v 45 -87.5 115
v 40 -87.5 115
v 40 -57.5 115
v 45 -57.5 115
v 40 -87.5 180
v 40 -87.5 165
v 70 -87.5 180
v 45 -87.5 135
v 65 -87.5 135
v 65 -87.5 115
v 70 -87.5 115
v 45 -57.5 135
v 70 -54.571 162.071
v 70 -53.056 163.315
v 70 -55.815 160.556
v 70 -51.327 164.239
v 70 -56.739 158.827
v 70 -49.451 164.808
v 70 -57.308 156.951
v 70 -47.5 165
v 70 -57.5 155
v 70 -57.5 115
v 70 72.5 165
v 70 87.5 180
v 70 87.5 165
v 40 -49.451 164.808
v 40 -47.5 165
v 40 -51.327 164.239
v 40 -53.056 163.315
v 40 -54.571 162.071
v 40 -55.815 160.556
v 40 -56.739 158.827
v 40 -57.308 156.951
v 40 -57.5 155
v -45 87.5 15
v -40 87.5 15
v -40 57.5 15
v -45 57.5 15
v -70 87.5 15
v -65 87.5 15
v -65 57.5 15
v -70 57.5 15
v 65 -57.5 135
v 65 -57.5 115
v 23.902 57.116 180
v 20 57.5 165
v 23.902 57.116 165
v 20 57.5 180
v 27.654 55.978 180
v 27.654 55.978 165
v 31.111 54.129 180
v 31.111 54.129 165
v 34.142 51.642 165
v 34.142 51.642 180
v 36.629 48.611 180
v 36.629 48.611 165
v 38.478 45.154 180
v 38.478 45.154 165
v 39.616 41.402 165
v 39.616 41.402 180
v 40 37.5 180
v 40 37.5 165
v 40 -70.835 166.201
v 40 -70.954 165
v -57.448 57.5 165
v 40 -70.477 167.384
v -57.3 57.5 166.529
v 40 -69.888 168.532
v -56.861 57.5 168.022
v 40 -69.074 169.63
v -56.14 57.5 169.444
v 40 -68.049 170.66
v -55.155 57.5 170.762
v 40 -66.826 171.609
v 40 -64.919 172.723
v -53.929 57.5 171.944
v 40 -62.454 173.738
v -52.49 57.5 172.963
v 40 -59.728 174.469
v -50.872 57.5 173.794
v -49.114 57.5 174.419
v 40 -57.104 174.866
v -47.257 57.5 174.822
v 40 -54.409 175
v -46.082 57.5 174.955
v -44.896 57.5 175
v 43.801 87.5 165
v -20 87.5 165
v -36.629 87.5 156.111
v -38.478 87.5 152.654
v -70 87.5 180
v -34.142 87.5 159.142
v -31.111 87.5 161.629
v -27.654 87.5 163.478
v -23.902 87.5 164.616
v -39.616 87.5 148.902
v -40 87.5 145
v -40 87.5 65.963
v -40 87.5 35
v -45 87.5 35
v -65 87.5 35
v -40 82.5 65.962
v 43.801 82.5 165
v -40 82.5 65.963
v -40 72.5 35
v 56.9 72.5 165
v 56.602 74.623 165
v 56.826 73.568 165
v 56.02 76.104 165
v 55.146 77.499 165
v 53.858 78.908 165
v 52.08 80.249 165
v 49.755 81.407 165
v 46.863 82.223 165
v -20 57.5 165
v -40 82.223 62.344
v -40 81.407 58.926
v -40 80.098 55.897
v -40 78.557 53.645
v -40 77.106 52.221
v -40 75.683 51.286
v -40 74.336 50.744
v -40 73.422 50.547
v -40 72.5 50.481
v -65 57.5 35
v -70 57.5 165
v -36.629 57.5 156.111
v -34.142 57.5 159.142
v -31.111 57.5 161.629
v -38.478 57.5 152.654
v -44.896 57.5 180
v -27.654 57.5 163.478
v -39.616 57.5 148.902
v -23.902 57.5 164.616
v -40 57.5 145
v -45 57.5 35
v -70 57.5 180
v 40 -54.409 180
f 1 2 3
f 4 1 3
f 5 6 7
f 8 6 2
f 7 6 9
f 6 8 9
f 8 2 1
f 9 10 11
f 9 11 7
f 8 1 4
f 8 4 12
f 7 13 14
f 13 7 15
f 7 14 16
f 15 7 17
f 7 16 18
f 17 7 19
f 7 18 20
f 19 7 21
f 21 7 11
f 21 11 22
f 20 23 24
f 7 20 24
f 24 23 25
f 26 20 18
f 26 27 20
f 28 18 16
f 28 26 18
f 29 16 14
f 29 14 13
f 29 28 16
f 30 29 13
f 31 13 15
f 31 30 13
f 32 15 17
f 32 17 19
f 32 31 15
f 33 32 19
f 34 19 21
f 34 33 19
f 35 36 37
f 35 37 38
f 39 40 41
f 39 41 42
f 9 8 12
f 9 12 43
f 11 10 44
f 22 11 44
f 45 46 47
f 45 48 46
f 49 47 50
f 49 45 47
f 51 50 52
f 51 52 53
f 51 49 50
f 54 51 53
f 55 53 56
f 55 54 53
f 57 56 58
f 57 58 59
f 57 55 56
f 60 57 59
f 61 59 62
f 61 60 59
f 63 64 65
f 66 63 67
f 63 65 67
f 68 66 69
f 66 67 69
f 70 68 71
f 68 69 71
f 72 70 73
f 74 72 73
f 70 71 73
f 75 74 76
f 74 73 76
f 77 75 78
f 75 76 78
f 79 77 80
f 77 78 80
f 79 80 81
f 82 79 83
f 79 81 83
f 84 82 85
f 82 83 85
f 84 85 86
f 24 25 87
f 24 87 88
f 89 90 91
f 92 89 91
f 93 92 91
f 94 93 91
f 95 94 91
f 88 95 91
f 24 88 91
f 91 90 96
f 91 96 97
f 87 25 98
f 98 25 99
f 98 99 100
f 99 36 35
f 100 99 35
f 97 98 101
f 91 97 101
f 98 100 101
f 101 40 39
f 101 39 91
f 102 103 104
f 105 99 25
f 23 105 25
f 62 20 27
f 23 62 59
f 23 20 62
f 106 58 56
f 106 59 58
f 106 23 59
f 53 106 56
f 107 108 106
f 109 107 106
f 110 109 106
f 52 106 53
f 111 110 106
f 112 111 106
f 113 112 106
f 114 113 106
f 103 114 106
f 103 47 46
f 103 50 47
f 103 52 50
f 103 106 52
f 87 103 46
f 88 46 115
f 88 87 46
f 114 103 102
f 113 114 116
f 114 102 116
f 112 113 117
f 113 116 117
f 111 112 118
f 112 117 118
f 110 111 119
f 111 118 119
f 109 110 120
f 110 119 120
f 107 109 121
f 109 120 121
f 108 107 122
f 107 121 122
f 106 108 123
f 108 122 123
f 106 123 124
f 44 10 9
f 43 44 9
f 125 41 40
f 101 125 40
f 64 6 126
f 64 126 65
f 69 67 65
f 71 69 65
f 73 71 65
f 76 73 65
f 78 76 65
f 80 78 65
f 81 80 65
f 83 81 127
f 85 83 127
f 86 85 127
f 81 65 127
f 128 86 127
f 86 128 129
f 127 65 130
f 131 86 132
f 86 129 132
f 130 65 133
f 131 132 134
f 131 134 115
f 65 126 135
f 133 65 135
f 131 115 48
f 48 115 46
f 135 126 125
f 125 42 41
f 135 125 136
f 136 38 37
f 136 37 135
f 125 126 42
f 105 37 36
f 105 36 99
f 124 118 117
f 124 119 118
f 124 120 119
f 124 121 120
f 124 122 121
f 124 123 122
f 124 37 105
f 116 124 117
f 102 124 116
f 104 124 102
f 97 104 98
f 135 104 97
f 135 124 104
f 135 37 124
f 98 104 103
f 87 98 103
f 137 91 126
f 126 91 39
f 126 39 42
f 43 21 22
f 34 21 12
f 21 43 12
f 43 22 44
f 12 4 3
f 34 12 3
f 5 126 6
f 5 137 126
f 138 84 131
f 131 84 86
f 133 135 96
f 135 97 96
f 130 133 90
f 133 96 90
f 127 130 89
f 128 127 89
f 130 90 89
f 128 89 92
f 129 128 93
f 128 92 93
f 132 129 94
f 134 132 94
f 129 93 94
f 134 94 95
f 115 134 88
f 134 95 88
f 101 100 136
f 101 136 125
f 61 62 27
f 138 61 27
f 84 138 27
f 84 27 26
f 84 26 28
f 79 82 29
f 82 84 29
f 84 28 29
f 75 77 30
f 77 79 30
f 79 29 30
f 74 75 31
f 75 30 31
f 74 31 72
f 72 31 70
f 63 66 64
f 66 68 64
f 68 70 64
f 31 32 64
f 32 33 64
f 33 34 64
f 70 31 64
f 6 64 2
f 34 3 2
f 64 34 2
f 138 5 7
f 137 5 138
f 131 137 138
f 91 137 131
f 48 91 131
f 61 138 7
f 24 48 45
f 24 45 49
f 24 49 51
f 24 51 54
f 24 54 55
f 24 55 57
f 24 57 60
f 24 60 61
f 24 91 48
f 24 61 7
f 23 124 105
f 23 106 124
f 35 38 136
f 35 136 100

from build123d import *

# Parameters (mm, degrees)
SKETCH_1_W           = 140
SKETCH_1_H           = 175
EXTRUDE_1_DEPTH      = 150
SKETCH_2_W           = 110
SKETCH_2_H           = 145
CUT_EXTRUDE_1_DEPTH  = 150
SKETCH_3_W           = 115
SKETCH_3_H           = 145
CUT_EXTRUDE_2_DEPTH  = 150
SKETCH_4_W           = 110
SKETCH_4_H           = 135
CUT_EXTRUDE_3_DEPTH  = 150
SKETCH_5_W           = 20
SKETCH_5_H           = 40
CUT_EXTRUDE_4_DEPTH  = 150
SKETCH_6_W           = 20
SKETCH_6_H           = 115
CUT_EXTRUDE_5_DEPTH  = 150
EXTRUDE_2_DEPTH      = 30
CUT_EXTRUDE_6_DEPTH  = 30
SKETCH_9_W           = 30
SKETCH_9_H           = 30
CUT_EXTRUDE_7_DEPTH  = 15
SKETCH_10_W          = 20
SKETCH_10_H          = 60
CUT_EXTRUDE_8_DEPTH  = 20
EXTRUDE_3_DEPTH      = 5
EXTRUDE_4_DEPTH      = 5
EXTRUDE_1_2_DEPTH    = 10
EXTRUDE_2_2_DEPTH    = 10
FILLET_1_R           = 10
CUT_EXTRUDE_9_DEPTH  = 52
CUT_EXTRUDE_10_DEPTH = 52
FILLET_2_R           = 20
FILLET_3_R           = 10


with BuildPart() as part:
    # 草图1 → Extrude 1 (new body)
    with BuildSketch(Plane.XY):
        Rectangle(SKETCH_1_W, SKETCH_1_H)
    extrude(amount=EXTRUDE_1_DEPTH)

    # 草图2 → 切除-拉伸1 (cut)
    with BuildSketch(Plane.XY.offset(150)):
        with Locations((-15, -15)):
            Rectangle(SKETCH_2_W, SKETCH_2_H)
    extrude(amount=-CUT_EXTRUDE_1_DEPTH, mode=Mode.SUBTRACT)

    # 草图3 → 切除-拉伸2 (cut)
    with BuildSketch(Plane.ZY.offset(-40)):
        with Locations((57.5, -15)):
            Rectangle(SKETCH_3_W, SKETCH_3_H)
    extrude(amount=-CUT_EXTRUDE_2_DEPTH, mode=Mode.SUBTRACT)

    # 草图4 → 切除-拉伸3 (cut)
    with BuildSketch(Plane.XZ.offset(-57.5)):
        with Locations((15, 67.5)):
            Rectangle(SKETCH_4_W, SKETCH_4_H)
    extrude(amount=-CUT_EXTRUDE_3_DEPTH, mode=Mode.SUBTRACT)

    # 草图5 → 切除-拉伸4 (cut)
    with BuildSketch(Plane.XZ.offset(87.5)):
        with Locations((55, 115)):
            Rectangle(SKETCH_5_W, SKETCH_5_H)
    extrude(amount=-CUT_EXTRUDE_4_DEPTH, mode=Mode.SUBTRACT)

    # 草图6 → 切除-拉伸5 (cut)
    with BuildSketch(Plane.ZY.offset(-40)):
        with Locations((125, 0)):
            Rectangle(SKETCH_6_W, SKETCH_6_H)
    extrude(amount=-CUT_EXTRUDE_5_DEPTH, mode=Mode.SUBTRACT)

    # 草图7 → Extrude 2 (add)
    with BuildSketch(Plane.XY.offset(150)):
        Polygon((-70, 57.5), (40, 57.5), (40, -87.5), (70, -87.5), (70, 87.5), (-70, 87.5), align=None)
    extrude(amount=EXTRUDE_2_DEPTH)

    # 草图8 → 切除-拉伸6 (cut)
    with BuildSketch(Plane(origin=(0, 0, 135), x_dir=(-1, 0, 0), z_dir=(0, 0, -1))):
        Polygon((-65, -57.5), (-45, -57.5), (-40, -57.5), (-40, 57.5), (40, 57.5), (40, 87.5), (-70, 87.5), (-70, -57.5), align=None)
    extrude(amount=-CUT_EXTRUDE_6_DEPTH, mode=Mode.SUBTRACT)

    # 草图9 → 切除-拉伸7 (cut)
    with BuildSketch(Plane(origin=(0, 0, 0), x_dir=(-1, 0, 0), z_dir=(0, 0, -1))):
        with Locations((55, 72.5)):
            Rectangle(SKETCH_9_W, SKETCH_9_H)
    extrude(amount=-CUT_EXTRUDE_7_DEPTH, mode=Mode.SUBTRACT)

    # 草图10 → 切除-拉伸8 (cut)
    with BuildSketch(Plane(origin=(0, 0, 15), x_dir=(-1, 0, 0), z_dir=(0, 0, -1))):
        with Locations((55, 87.5)):
            Rectangle(SKETCH_10_W, SKETCH_10_H)
    extrude(amount=-CUT_EXTRUDE_8_DEPTH, mode=Mode.SUBTRACT)

    # 草图11 → 凸台-拉伸3 (add)
    with BuildSketch(Plane(origin=(0, 87.5, 0), x_dir=(1, 0, 0), z_dir=(0, 1, 0))):
        Polygon((-40, -35), (70, -165), (-40, -165), align=None)
    extrude(amount=-EXTRUDE_3_DEPTH)

    # 草图12 → 凸台-拉伸4 (add)
    with BuildSketch(Plane.XY.offset(180)):
        Polygon((-70, 57.5), (40, -87.5), (40, 57.5), align=None)
    extrude(amount=-EXTRUDE_4_DEPTH)

    # 草图13 → Extrude 1 2 (add)
    with BuildSketch(Plane(origin=(0, 0, 175), x_dir=(-1, 0, 0), z_dir=(0, 0, -1))):
        Polygon((70, 57.5), (-40, -87.5), (-47.966912709, -81.456135186), (62.033087291, 63.543864814), align=None)
    extrude(amount=EXTRUDE_1_2_DEPTH)

    # 草图14 → Extrude 2 2 (add)
    with BuildSketch(Plane.XZ.offset(-82.5)):
        Polygon((-40, 35), (70, 165), (62.366137146, 171.459422415), (-47.633862854, 41.459422415), align=None)
    extrude(amount=EXTRUDE_2_2_DEPTH)

    # 圆角1
    fillet_1_edges = [part.edges().sort_by_distance(p)[0] for p in [
        (8.450236013, 82.5, 107.740630166),
        (-8.724043199, -6.727147853, 175),
    ]]
    fillet(fillet_1_edges, radius=FILLET_1_R - 0.0001)  # a hair under: the kernel refuses the full size

    # 草图15 → 切除-拉伸9 (cut)
    with BuildSketch(Plane(origin=(0, 0, 175), x_dir=(-1, 0, 0), z_dir=(0, 0, -1))):
        Polygon((-40, 57.5), (-40, -54.408591412), (44.896172796, 57.5), align=None)
    extrude(amount=-CUT_EXTRUDE_9_DEPTH, mode=Mode.SUBTRACT)

    # 草图16 → 切除-拉伸10 (cut)
    with BuildSketch(Plane.XZ.offset(-82.5)):
        Polygon((-40, 165), (-40, 65.962520665), (43.800944052, 165), align=None)
    extrude(amount=-CUT_EXTRUDE_10_DEPTH, mode=Mode.SUBTRACT)

    # 圆角2
    fillet_2_edges = [part.edges().sort_by_distance(p)[0] for p in [
        (40, 57.5, 172.5),
        (-40, 72.5, 165),
    ]]
    fillet(fillet_2_edges, radius=FILLET_2_R)

    # 圆角3
    fillet_3_edges = [part.edges().sort_by_distance(p)[0] for p in [
        (55, -57.5, 165),
    ]]
    fillet(fillet_3_edges, radius=FILLET_3_R)


solid = part.part
